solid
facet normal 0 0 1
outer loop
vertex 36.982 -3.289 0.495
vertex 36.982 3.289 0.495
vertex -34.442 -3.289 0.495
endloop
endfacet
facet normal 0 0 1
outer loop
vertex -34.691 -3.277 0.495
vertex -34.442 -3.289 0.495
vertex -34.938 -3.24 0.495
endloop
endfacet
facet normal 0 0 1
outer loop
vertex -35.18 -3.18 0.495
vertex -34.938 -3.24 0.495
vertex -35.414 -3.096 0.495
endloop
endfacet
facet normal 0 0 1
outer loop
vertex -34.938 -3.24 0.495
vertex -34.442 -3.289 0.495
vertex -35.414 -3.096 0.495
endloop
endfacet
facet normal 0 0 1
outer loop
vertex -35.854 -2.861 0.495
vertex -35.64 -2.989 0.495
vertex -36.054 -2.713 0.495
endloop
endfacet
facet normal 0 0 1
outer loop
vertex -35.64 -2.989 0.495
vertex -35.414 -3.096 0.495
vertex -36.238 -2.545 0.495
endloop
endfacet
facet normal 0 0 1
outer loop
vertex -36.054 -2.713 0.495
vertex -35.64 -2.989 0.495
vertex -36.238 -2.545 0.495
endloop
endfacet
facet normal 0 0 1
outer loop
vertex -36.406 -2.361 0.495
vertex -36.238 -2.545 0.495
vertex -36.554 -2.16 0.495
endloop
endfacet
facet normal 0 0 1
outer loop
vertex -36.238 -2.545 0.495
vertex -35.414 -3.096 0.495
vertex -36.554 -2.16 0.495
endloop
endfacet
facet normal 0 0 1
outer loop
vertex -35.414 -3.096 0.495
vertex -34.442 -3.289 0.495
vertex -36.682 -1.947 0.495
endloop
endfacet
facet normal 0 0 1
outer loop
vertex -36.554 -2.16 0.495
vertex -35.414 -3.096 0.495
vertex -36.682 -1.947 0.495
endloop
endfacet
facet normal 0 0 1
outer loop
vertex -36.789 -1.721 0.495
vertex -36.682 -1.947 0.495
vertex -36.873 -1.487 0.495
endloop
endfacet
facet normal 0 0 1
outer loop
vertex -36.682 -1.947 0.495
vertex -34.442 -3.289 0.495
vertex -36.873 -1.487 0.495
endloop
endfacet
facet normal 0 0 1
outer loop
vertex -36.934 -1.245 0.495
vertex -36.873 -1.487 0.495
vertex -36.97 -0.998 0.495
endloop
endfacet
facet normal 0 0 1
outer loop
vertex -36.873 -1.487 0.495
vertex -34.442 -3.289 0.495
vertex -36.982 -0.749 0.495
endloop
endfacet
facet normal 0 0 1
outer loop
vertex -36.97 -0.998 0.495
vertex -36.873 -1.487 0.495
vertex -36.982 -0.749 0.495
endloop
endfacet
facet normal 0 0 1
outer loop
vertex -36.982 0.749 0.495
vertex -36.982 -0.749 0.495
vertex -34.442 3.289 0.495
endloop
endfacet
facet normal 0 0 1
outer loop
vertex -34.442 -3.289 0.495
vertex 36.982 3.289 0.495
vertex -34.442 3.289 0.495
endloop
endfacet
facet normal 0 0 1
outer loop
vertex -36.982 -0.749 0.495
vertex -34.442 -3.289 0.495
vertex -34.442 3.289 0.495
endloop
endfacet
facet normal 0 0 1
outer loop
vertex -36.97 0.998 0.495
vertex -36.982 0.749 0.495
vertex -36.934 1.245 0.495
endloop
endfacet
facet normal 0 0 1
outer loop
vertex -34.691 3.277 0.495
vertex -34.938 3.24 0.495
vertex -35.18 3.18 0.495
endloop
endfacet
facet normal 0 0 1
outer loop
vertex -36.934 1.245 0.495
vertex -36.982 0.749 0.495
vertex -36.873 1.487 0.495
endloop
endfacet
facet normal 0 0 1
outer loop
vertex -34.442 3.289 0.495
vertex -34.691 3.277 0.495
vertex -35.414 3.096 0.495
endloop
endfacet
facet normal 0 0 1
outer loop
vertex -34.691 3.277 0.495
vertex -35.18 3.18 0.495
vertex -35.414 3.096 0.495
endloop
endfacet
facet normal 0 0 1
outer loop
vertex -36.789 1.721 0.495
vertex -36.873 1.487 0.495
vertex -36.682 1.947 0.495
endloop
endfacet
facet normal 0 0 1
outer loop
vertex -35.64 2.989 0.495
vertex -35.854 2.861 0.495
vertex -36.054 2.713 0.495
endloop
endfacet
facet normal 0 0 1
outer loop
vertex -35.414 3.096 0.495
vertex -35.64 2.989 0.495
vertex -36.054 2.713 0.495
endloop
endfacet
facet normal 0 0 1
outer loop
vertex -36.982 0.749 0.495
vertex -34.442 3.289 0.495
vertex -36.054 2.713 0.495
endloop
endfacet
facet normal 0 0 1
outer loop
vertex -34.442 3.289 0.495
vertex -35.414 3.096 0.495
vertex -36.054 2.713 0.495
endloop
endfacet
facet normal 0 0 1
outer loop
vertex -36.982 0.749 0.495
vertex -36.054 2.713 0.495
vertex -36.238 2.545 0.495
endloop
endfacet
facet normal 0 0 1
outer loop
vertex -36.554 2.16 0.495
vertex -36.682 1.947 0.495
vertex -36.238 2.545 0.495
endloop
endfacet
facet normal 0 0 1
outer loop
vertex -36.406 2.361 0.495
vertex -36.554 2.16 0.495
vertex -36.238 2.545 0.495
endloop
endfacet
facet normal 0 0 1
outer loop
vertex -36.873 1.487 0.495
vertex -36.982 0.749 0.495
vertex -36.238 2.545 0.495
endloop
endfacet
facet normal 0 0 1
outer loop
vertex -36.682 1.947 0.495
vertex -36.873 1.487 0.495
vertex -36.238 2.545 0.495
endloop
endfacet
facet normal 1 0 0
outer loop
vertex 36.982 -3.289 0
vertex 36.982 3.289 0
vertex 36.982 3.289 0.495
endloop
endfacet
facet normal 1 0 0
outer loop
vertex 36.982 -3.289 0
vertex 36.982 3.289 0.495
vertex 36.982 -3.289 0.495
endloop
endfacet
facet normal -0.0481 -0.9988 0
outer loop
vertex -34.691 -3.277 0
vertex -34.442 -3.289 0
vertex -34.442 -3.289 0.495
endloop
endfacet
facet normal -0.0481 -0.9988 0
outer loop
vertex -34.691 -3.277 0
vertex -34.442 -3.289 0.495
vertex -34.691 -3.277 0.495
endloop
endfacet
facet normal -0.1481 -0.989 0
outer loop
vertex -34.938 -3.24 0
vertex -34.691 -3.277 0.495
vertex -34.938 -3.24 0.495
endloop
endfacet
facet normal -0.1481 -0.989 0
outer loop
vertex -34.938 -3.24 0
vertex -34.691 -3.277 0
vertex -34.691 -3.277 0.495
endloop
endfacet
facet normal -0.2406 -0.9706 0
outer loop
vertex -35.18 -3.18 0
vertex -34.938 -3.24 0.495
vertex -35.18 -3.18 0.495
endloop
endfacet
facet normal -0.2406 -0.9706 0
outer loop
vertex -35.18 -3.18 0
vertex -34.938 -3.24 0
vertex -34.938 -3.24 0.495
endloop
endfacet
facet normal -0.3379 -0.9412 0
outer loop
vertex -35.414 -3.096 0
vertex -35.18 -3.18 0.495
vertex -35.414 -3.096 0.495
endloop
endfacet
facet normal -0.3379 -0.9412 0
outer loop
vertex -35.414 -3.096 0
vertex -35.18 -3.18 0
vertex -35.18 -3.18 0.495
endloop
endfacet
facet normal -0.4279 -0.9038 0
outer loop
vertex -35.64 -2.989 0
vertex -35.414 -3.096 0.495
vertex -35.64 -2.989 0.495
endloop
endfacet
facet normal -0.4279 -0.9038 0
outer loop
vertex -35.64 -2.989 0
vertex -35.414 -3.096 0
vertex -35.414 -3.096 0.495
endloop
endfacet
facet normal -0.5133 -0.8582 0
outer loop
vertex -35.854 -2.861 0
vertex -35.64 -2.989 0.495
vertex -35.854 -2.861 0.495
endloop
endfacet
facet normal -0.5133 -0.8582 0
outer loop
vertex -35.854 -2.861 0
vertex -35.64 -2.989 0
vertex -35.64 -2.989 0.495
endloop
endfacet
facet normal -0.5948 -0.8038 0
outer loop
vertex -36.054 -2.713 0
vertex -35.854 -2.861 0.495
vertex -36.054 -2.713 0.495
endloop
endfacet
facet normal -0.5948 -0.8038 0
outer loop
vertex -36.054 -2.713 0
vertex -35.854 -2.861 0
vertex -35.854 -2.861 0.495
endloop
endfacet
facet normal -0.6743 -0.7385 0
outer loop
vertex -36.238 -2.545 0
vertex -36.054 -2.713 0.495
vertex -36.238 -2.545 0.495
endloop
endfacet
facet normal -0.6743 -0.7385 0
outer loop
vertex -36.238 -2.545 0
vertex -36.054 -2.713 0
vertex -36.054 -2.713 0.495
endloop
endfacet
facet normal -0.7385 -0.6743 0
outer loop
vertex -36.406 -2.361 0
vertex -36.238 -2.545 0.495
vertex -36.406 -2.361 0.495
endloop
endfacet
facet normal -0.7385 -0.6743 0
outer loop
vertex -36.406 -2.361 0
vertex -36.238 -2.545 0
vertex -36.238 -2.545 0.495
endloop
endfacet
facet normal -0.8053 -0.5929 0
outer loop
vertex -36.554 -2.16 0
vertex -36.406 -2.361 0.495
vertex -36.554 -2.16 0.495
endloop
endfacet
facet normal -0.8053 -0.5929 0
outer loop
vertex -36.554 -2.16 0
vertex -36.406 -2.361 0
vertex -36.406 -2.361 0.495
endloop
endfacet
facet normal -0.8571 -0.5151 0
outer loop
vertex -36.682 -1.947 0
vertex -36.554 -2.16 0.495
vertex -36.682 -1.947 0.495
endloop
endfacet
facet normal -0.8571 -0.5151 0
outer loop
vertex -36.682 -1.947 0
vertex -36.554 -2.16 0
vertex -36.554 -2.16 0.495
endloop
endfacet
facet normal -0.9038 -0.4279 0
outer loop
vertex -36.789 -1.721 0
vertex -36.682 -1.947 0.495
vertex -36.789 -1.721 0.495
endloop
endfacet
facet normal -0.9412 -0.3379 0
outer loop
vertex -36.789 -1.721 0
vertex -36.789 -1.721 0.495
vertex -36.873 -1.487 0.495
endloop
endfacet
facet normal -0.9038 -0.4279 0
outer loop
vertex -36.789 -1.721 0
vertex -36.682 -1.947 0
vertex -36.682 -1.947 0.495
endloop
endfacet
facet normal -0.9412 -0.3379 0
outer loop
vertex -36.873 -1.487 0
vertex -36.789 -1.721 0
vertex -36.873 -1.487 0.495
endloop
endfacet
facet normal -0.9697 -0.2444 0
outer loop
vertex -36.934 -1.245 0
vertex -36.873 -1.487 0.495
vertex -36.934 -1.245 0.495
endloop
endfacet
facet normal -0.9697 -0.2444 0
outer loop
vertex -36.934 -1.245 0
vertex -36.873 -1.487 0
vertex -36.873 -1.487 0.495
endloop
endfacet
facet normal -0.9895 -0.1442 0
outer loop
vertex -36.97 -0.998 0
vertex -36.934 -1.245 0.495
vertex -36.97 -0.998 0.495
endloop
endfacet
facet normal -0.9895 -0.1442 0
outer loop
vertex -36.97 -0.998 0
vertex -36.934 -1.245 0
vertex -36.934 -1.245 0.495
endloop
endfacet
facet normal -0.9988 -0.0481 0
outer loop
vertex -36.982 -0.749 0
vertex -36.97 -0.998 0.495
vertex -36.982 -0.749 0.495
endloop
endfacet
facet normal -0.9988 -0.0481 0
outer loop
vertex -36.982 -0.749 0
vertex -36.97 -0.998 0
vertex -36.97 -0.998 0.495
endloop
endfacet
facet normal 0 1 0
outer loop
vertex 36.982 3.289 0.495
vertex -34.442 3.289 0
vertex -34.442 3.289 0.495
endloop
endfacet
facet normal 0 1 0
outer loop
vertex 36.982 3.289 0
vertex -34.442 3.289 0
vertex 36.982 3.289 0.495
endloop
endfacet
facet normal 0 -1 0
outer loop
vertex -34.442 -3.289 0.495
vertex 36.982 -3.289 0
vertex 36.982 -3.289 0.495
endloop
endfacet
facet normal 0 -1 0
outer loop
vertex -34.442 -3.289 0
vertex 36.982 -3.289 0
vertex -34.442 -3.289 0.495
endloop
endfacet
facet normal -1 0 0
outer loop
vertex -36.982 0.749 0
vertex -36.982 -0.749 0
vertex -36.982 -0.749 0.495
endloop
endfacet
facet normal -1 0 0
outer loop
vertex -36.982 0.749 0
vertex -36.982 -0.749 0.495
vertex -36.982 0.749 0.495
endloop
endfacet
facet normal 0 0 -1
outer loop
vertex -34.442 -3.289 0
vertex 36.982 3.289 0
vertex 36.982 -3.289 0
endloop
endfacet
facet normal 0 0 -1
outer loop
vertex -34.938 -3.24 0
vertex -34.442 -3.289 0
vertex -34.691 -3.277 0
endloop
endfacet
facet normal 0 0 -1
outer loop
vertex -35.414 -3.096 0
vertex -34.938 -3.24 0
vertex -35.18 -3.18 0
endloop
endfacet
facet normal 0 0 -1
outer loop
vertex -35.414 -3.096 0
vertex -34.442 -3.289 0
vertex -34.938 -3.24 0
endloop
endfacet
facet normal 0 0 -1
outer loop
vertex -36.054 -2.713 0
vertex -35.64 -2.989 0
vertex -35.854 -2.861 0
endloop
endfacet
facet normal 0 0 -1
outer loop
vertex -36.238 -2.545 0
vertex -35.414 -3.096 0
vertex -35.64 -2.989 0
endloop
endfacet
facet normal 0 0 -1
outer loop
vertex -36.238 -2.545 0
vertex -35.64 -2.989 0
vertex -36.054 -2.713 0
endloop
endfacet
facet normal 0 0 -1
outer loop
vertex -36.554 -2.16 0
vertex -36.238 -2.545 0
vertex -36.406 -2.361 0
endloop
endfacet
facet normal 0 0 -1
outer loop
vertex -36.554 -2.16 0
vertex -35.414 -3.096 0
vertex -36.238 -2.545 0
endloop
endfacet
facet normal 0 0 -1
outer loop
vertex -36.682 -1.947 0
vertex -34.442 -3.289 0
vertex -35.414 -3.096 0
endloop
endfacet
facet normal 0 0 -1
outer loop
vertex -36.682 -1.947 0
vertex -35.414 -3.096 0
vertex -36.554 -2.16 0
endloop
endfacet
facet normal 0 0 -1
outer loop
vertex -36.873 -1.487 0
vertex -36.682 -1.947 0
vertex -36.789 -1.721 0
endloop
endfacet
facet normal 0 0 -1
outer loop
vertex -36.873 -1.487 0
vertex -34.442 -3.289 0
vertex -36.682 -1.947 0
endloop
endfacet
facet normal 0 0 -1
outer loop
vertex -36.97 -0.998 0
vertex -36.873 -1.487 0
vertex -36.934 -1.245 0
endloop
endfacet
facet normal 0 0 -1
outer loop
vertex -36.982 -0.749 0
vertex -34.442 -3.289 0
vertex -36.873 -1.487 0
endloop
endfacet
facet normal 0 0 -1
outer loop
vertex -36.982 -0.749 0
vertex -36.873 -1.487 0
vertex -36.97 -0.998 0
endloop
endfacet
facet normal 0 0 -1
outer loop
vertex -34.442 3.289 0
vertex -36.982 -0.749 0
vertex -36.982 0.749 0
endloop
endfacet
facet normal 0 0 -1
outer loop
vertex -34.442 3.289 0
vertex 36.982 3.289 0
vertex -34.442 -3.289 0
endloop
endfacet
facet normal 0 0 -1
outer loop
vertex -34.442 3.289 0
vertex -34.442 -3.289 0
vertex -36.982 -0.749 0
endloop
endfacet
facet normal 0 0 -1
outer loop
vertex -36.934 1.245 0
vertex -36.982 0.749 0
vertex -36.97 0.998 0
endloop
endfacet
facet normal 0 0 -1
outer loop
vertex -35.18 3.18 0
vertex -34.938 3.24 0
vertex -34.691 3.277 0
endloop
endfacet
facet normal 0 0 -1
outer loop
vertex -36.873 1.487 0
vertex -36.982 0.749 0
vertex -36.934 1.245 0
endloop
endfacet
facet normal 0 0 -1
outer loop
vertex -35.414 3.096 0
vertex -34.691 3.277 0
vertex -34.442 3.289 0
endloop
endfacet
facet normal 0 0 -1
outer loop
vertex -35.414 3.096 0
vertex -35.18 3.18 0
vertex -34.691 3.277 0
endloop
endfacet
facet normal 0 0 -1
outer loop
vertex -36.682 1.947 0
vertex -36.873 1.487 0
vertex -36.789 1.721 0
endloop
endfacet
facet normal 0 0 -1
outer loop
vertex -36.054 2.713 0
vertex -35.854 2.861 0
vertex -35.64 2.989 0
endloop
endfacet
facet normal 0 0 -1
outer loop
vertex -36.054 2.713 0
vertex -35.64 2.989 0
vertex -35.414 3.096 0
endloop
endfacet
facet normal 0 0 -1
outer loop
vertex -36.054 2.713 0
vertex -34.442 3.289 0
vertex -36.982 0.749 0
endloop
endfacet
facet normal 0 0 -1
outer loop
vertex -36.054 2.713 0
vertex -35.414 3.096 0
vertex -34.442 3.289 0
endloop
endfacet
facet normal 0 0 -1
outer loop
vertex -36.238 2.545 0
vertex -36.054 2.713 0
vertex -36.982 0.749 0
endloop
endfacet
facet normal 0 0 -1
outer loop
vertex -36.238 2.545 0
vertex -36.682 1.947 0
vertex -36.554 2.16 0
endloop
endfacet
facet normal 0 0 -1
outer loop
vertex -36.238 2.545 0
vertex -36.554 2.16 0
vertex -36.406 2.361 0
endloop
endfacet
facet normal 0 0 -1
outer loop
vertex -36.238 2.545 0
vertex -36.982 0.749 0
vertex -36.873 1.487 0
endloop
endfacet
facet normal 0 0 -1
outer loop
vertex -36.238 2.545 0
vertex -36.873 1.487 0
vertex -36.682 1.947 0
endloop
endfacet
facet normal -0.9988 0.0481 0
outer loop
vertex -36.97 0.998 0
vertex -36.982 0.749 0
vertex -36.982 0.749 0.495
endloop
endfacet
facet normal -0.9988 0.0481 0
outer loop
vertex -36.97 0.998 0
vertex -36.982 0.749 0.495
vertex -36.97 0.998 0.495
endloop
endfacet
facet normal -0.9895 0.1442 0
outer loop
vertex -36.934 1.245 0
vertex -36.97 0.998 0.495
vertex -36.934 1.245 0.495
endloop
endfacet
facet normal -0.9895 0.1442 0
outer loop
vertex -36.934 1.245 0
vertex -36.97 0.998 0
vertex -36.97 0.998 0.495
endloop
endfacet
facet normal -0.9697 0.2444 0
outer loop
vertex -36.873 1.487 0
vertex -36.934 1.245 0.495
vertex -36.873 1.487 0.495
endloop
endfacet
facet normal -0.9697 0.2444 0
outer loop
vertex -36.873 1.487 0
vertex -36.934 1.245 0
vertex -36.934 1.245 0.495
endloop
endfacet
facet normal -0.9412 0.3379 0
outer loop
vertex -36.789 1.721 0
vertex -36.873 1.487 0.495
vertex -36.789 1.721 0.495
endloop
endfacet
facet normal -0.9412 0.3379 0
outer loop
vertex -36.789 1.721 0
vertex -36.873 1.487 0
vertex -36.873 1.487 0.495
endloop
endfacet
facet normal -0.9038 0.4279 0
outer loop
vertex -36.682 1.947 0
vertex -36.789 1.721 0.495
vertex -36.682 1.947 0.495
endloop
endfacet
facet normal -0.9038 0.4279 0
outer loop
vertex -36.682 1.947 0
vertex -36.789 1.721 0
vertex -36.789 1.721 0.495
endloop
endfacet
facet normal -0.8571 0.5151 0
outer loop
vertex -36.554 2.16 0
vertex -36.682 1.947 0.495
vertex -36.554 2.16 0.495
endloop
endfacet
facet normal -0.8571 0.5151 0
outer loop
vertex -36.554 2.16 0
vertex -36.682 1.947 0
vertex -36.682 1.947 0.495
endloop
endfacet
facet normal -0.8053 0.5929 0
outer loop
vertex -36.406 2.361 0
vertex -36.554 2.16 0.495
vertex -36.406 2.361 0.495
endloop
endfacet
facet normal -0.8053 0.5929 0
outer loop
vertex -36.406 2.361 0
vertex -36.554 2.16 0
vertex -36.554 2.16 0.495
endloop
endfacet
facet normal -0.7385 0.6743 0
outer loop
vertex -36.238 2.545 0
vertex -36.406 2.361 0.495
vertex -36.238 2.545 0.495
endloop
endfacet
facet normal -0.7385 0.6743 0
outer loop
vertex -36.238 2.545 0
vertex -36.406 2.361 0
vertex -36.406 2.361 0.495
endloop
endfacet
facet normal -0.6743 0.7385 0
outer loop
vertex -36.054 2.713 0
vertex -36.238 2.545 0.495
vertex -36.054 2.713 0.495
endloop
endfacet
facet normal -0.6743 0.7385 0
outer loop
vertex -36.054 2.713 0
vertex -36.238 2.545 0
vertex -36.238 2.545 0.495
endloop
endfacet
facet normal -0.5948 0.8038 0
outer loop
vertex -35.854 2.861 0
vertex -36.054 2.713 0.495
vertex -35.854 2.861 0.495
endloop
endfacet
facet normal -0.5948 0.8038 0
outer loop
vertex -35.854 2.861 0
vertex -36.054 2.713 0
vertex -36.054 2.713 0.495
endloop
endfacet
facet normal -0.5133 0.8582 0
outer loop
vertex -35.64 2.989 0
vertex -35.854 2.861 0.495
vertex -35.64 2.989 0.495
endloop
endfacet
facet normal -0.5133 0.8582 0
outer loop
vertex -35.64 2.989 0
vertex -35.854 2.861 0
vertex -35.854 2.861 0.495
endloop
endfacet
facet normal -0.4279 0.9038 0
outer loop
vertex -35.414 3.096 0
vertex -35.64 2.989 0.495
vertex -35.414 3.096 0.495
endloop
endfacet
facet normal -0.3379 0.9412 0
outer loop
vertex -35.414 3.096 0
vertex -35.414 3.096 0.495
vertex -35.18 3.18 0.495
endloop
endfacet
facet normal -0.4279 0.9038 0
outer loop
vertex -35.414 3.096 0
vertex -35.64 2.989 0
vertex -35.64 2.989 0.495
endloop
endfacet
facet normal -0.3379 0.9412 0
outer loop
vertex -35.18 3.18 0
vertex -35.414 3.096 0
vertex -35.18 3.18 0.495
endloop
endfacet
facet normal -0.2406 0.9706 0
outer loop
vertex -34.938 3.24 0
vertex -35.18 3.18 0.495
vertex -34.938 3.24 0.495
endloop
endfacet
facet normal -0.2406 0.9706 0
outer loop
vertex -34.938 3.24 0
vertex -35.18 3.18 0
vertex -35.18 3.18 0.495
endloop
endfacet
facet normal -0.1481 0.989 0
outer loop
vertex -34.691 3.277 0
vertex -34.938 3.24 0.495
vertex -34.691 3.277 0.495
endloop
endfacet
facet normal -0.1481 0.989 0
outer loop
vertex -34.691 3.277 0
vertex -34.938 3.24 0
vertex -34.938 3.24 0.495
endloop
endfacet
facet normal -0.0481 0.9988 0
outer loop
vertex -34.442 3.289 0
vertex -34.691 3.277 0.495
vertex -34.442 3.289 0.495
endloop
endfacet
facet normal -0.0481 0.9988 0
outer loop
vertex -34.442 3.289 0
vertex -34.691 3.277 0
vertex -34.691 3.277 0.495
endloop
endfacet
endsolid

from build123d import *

# Parameters (mm, degrees)
BOSS_EXTRUDE1_DEPTH = 0.4953


with BuildPart() as part:
    # Sketch1 → Boss-Extrude1 (new body)
    with BuildSketch(Plane.XY):
        with BuildLine():
            Line((36.9824, -3.2893), (-34.4424, -3.2893))
            ThreePointArc((-34.4424, -3.2893), (-36.238451224, -2.545351224), (-36.9824, -0.7493))
            Line((-36.9824, -0.7493), (-36.9824, 0.7493))
            ThreePointArc((-36.9824, 0.7493), (-36.238451224, 2.545351224), (-34.4424, 3.2893))
            Line((-34.4424, 3.2893), (36.9824, 3.2893))
            Line((36.9824, 3.2893), (36.9824, -3.2893))
        make_face()
    extrude(amount=BOSS_EXTRUDE1_DEPTH)


solid = part.part
